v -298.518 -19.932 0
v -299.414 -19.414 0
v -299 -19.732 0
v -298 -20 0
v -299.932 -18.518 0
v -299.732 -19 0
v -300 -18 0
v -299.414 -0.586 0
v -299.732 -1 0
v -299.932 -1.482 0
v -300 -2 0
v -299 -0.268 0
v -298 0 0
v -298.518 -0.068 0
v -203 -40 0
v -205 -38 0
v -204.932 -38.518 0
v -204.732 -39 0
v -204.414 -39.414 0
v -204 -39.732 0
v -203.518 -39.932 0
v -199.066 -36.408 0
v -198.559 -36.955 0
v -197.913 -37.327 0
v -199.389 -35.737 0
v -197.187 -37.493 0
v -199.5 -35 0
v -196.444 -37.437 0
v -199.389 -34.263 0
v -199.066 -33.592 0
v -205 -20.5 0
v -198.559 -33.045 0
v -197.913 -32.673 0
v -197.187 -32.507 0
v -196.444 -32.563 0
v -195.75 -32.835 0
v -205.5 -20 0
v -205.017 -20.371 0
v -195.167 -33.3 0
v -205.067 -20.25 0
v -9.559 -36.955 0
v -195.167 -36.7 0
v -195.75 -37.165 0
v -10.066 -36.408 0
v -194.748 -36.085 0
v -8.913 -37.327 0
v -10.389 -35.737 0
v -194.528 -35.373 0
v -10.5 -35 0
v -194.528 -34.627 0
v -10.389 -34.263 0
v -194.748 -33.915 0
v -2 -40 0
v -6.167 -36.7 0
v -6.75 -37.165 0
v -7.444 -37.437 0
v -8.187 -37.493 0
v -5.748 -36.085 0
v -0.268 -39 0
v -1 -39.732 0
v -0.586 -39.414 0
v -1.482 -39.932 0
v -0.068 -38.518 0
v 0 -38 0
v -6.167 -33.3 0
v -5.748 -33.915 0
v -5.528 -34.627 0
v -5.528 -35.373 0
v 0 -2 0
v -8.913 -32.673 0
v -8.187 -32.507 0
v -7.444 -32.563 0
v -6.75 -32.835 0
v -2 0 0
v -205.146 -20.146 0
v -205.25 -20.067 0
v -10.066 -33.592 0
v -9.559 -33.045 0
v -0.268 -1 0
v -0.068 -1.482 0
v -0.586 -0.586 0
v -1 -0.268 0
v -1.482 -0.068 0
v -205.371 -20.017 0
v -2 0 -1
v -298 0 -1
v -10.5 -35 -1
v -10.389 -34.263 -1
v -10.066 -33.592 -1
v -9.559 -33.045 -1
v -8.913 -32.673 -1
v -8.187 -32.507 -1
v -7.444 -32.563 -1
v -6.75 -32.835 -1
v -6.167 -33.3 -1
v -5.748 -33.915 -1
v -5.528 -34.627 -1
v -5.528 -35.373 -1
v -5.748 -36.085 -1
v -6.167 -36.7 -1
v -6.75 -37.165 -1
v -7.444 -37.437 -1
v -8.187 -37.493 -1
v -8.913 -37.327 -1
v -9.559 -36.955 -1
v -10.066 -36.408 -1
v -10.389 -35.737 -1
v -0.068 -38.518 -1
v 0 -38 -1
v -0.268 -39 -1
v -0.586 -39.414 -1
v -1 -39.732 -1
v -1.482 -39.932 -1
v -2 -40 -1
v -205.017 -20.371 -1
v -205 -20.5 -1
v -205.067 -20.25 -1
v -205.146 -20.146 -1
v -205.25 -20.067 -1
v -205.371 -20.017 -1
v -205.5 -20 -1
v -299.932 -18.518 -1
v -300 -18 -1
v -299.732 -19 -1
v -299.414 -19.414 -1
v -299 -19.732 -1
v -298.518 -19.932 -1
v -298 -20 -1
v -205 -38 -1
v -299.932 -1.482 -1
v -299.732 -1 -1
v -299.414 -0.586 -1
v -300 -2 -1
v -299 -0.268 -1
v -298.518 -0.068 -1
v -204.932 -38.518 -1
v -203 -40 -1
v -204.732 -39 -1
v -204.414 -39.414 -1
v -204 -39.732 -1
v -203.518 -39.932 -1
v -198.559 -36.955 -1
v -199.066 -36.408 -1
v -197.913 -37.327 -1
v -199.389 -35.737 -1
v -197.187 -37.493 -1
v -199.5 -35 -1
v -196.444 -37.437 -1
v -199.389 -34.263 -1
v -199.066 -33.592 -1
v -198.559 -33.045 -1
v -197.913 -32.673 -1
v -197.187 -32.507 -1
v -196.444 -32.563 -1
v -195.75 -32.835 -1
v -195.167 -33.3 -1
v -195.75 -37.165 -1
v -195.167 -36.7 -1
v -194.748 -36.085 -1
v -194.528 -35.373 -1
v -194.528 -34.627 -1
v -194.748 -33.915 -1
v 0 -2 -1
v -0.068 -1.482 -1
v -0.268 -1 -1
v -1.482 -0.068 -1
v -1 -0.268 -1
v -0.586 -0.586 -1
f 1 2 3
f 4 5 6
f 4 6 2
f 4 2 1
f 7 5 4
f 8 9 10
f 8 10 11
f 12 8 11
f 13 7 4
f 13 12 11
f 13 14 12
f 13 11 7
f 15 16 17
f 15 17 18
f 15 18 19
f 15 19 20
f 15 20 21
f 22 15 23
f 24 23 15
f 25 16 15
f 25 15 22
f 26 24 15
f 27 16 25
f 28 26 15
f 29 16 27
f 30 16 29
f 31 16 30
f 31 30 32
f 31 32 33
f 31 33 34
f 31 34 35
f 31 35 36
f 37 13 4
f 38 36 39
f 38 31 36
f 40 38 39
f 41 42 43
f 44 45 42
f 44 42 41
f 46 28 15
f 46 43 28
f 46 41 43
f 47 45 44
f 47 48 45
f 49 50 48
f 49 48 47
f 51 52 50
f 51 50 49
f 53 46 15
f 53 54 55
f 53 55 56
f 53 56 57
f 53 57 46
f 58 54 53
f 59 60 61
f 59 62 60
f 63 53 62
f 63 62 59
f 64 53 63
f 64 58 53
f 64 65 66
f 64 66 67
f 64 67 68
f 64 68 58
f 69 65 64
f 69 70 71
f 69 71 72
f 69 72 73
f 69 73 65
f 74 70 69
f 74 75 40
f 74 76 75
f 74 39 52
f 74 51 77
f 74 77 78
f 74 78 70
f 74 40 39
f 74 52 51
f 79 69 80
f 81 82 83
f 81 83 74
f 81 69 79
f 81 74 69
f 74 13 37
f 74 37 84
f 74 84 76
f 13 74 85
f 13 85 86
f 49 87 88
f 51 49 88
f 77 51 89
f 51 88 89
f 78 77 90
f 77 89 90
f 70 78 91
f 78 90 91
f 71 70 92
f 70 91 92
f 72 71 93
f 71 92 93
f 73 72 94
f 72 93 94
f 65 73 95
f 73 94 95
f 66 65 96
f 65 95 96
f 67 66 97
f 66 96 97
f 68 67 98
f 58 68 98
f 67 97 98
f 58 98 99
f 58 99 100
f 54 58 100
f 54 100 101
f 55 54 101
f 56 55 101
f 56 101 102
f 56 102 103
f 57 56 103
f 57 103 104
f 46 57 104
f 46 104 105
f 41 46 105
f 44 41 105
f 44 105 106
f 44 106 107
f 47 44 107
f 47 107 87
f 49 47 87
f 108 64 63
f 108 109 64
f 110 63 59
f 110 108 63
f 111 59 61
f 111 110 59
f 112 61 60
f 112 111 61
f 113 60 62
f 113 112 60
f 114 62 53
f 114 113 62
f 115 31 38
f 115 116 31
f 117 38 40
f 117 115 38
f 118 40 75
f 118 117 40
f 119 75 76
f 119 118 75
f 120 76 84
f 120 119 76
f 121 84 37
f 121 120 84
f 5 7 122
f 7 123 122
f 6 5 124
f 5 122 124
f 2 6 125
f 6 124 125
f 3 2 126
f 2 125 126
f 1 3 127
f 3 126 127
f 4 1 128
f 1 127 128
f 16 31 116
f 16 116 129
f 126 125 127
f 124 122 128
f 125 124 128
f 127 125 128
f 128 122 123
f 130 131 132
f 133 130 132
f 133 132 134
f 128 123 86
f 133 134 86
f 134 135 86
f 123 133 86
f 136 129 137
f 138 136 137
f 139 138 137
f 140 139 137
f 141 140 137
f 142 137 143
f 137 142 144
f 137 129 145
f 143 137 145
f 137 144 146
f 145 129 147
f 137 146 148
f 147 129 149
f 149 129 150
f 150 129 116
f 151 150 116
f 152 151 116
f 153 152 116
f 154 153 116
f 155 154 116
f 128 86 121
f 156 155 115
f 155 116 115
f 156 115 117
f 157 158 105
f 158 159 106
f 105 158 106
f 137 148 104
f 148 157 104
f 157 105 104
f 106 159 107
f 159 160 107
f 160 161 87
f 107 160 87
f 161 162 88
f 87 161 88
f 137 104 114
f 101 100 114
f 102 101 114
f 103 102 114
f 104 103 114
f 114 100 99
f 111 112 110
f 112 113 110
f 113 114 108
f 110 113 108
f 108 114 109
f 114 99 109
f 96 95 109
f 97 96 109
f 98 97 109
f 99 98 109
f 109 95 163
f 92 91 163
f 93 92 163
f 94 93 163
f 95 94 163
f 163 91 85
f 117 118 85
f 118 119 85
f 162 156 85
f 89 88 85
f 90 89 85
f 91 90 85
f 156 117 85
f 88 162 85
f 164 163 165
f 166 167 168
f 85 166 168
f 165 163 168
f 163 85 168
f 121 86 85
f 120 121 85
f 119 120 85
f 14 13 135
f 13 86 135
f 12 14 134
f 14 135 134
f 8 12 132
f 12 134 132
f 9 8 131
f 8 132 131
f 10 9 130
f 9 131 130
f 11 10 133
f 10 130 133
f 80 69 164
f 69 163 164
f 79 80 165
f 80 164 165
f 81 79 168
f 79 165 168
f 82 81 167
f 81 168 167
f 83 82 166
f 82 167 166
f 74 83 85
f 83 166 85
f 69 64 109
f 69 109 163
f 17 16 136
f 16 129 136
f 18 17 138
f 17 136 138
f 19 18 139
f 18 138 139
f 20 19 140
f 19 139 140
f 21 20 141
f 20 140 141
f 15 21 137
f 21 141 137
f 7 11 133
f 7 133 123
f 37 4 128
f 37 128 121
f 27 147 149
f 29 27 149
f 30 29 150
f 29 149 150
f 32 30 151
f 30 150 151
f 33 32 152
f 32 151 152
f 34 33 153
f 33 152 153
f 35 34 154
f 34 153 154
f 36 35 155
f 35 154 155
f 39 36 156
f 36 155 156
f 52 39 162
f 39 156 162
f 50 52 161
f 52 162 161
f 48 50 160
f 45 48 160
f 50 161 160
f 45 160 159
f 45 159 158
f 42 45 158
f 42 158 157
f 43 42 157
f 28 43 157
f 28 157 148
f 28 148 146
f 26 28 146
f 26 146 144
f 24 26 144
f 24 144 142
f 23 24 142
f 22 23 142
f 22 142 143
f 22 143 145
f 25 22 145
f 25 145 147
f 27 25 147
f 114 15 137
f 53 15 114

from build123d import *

# Parameters (mm, degrees)
F1_DEPTH = 1
F2_R     = 2
F3_R     = 0.5
F5_D     = 5


with BuildPart() as f1:
    # F0 (on Top) → F1 (new body)
    with BuildSketch(Plane.XY):
        Polygon((0, -40), (0, 0), (-300, 0), (-300, -20), (-205, -20), (-205, -40), align=None)
    extrude(amount=-F1_DEPTH)

    # F2
    f2_edges = [f1.edges().sort_by_distance(p)[0] for p in [
        (-300, -20, -0.5),
        (-300, 0, -0.5),
        (-205, -40, -0.5),
        (0, 0, -0.5),
        (0, -40, -0.5),
    ]]
    fillet(f2_edges, radius=F2_R)

    # F3
    f3_edges = [f1.edges().sort_by_distance(p)[0] for p in [
        (-205, -20, -0.5),
    ]]
    fillet(f3_edges, radius=F3_R)

    # F5 (through all)
    with Locations(Plane.XY):
        with Locations((-197, -35), (-8, -35)):
            Hole(F5_D / 2)


solid = f1.part
